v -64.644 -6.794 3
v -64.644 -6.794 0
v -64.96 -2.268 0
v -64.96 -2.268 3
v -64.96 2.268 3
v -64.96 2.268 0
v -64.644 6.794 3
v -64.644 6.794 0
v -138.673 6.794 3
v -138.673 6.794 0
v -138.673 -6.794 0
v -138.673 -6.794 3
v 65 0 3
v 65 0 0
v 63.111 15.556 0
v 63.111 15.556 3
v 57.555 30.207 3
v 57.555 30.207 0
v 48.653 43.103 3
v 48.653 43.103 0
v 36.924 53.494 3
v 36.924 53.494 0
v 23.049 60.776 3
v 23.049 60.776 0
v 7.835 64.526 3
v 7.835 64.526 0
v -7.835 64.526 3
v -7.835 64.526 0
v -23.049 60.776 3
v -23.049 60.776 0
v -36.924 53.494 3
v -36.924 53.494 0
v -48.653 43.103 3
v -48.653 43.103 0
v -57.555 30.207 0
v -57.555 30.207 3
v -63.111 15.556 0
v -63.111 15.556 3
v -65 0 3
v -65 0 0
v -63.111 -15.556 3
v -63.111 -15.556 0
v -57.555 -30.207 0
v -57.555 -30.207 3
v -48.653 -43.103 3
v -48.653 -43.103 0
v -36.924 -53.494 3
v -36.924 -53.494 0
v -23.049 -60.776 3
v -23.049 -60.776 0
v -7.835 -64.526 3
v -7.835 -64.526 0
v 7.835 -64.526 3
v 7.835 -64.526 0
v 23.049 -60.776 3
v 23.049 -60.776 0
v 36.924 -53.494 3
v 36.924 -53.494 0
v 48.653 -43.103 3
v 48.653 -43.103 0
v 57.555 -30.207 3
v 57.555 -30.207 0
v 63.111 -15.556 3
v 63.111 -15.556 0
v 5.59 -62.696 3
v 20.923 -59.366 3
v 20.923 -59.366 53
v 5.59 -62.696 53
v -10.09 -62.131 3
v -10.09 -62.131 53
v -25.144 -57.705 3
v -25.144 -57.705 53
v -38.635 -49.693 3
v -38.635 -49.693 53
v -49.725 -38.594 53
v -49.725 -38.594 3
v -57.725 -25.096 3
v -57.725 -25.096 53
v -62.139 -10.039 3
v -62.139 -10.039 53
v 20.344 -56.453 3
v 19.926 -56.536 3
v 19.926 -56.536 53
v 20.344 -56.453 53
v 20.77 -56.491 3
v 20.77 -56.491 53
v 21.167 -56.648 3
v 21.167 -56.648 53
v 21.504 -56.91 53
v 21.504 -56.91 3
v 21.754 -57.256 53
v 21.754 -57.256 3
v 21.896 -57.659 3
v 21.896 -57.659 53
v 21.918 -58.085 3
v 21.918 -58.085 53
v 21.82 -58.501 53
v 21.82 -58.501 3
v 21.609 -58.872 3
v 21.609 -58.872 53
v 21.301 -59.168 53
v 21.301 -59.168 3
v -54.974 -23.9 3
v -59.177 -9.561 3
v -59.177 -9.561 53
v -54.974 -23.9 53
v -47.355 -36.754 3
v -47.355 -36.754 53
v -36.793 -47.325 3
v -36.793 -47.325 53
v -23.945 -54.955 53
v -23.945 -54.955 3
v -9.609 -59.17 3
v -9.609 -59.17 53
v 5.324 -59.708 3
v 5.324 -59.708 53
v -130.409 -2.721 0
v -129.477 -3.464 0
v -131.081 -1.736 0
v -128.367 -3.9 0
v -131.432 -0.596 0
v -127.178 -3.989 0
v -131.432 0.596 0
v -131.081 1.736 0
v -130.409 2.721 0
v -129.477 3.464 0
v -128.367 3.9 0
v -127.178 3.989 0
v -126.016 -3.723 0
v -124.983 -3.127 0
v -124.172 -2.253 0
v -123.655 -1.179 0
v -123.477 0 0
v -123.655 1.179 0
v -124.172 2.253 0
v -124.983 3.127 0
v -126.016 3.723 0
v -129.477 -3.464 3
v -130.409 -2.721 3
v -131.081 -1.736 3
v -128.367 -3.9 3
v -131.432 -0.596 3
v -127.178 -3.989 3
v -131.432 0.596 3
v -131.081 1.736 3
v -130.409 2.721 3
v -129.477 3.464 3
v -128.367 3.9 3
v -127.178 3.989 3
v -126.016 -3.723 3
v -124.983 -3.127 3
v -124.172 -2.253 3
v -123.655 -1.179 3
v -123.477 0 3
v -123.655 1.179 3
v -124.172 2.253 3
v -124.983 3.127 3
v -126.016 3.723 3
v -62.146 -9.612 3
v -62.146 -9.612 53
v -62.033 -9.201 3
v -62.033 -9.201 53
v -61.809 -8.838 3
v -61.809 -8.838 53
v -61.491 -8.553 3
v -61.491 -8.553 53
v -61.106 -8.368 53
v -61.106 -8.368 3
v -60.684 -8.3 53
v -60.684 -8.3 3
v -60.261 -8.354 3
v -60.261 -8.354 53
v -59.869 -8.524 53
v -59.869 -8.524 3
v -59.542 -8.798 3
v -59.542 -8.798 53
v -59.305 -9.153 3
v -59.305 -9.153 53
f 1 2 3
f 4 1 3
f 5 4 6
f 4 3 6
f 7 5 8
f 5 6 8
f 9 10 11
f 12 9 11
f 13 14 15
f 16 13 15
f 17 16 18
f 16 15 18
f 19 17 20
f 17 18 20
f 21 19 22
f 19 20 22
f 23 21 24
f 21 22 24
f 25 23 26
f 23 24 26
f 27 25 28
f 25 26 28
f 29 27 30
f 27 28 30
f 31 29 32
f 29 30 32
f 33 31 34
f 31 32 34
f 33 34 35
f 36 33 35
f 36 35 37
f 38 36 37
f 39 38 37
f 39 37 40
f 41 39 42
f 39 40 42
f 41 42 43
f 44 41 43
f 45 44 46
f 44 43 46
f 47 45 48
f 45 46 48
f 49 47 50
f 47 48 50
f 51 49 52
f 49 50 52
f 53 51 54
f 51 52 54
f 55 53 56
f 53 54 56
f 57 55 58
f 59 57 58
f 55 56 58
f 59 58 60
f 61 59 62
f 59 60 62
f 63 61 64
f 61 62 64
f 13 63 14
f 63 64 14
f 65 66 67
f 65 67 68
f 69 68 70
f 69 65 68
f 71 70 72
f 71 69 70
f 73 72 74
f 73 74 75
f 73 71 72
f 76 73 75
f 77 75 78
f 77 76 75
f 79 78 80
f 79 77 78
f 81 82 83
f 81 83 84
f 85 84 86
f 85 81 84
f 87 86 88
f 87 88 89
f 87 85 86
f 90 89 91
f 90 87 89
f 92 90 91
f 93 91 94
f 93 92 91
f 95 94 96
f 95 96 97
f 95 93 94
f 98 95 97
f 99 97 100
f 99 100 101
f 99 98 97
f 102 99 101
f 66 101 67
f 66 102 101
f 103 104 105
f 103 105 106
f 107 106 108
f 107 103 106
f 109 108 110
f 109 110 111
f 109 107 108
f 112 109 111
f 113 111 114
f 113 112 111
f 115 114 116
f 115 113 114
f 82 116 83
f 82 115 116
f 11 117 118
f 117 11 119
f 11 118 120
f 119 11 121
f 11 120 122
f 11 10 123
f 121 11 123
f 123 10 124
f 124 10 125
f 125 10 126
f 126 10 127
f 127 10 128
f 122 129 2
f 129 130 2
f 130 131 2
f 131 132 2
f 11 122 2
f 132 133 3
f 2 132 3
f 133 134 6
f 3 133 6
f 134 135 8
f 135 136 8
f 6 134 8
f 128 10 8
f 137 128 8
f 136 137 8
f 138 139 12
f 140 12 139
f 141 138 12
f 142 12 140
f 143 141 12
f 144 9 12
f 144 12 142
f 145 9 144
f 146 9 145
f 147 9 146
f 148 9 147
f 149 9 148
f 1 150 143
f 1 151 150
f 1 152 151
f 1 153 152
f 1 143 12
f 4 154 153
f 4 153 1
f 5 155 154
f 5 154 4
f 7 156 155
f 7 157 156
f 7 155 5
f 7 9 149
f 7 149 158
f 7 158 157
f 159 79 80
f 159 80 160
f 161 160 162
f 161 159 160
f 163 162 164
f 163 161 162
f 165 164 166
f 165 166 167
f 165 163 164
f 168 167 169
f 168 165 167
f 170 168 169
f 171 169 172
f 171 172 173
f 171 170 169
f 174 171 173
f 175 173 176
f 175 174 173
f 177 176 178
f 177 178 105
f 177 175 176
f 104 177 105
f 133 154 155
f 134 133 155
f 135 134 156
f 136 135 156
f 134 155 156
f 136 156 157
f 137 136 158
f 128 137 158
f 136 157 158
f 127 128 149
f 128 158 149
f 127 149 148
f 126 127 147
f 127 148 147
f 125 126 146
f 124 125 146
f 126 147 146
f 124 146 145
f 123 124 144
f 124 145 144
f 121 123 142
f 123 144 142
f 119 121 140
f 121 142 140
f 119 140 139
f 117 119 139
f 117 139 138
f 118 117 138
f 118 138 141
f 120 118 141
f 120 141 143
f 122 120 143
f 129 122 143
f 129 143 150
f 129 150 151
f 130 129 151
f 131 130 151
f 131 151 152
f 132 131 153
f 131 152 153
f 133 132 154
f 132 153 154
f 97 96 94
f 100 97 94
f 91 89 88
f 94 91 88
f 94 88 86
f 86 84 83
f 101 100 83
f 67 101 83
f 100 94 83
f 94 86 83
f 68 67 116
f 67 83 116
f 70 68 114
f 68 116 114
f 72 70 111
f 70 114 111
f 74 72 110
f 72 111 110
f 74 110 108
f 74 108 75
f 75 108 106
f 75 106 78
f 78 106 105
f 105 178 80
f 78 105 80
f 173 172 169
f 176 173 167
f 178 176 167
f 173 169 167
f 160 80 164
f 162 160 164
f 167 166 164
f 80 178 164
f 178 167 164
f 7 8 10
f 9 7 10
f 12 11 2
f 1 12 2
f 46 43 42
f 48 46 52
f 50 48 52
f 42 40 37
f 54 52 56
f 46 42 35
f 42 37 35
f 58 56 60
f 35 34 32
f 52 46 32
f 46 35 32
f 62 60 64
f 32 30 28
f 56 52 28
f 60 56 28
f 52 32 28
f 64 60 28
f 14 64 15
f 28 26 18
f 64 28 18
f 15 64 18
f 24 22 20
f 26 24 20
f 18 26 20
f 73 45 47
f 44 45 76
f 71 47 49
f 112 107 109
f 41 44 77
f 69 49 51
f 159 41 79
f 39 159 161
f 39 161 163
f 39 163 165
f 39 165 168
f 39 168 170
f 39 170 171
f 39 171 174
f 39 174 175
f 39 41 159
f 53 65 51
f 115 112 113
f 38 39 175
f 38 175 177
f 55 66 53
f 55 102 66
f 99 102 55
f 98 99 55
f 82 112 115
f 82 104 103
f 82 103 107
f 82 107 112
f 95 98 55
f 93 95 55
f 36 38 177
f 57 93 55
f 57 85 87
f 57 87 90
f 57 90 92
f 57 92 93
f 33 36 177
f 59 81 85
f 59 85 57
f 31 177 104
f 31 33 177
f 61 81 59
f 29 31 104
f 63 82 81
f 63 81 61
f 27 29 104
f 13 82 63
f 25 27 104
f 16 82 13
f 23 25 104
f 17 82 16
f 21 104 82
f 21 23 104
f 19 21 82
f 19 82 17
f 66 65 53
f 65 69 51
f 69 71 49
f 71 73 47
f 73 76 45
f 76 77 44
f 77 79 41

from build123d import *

# Parameters (mm, degrees)
ESQUISSE1_R             = 65
BOSS_EXTRU_1_DEPTH      = 3
BOSS_EXTRU_3_DEPTH      = 3
ESQUISSE4_R             = 4
ENL_V_MAT_EXTRU_1_DEPTH = 3
BOSS_EXTRU_4_DEPTH      = 50


with BuildPart() as part:
    # Esquisse1 → Boss.-Extru.1 (new body)
    with BuildSketch(Plane.XY):
        Circle(ESQUISSE1_R)
    extrude(amount=BOSS_EXTRU_1_DEPTH)

    # Esquisse5 → Boss.-Extru.4 (add)
    with BuildSketch(Plane.XY.offset(3)):
        with BuildLine():
            ThreePointArc((-59.177464872, -9.560867786), (-30.607954016, -51.54159187), (19.92571249, -56.536258483))
            ThreePointArc((19.92571249, -56.536258483), (21.839021079, -57.452364506), (20.922915056, -59.365673094))
            ThreePointArc((20.922915056, -59.365673094), (-32.139760235, -54.121043305), (-62.139061346, -10.039351147))
            ThreePointArc((-62.139061346, -10.039351147), (-60.89750479, -8.31931123), (-59.177464872, -9.560867786))
        make_face()
    extrude(amount=BOSS_EXTRU_4_DEPTH)


with BuildPart() as body_2:
    # Esquisse3 → Boss.-Extru.3 (new body)
    with BuildSketch(Plane(origin=(0, 0, 0), x_dir=(-1, 0, 0), z_dir=(0, 0, -1))):
        with BuildLine():
            Line((64.643923199, 6.794350112), (138.672522355, 6.794350112))
            Line((138.672522355, 6.794350112), (138.672522355, -6.794350112))
            Line((138.672522355, -6.794350112), (64.643923199, -6.794350112))
            ThreePointArc((64.643923199, -6.794350112), (65, 0), (64.643923199, 6.794350112))
        make_face()
    extrude(amount=-BOSS_EXTRU_3_DEPTH)

    # Esquisse4 → Enlèv. mat.-Extru.1 (cut)
    with BuildSketch(Plane.XY.offset(3)):
        with Locations((-127.477067306, 0)):
            Circle(ESQUISSE4_R)
    extrude(amount=-ENL_V_MAT_EXTRU_1_DEPTH, mode=Mode.SUBTRACT)


solid = Compound([part.part, body_2.part])
